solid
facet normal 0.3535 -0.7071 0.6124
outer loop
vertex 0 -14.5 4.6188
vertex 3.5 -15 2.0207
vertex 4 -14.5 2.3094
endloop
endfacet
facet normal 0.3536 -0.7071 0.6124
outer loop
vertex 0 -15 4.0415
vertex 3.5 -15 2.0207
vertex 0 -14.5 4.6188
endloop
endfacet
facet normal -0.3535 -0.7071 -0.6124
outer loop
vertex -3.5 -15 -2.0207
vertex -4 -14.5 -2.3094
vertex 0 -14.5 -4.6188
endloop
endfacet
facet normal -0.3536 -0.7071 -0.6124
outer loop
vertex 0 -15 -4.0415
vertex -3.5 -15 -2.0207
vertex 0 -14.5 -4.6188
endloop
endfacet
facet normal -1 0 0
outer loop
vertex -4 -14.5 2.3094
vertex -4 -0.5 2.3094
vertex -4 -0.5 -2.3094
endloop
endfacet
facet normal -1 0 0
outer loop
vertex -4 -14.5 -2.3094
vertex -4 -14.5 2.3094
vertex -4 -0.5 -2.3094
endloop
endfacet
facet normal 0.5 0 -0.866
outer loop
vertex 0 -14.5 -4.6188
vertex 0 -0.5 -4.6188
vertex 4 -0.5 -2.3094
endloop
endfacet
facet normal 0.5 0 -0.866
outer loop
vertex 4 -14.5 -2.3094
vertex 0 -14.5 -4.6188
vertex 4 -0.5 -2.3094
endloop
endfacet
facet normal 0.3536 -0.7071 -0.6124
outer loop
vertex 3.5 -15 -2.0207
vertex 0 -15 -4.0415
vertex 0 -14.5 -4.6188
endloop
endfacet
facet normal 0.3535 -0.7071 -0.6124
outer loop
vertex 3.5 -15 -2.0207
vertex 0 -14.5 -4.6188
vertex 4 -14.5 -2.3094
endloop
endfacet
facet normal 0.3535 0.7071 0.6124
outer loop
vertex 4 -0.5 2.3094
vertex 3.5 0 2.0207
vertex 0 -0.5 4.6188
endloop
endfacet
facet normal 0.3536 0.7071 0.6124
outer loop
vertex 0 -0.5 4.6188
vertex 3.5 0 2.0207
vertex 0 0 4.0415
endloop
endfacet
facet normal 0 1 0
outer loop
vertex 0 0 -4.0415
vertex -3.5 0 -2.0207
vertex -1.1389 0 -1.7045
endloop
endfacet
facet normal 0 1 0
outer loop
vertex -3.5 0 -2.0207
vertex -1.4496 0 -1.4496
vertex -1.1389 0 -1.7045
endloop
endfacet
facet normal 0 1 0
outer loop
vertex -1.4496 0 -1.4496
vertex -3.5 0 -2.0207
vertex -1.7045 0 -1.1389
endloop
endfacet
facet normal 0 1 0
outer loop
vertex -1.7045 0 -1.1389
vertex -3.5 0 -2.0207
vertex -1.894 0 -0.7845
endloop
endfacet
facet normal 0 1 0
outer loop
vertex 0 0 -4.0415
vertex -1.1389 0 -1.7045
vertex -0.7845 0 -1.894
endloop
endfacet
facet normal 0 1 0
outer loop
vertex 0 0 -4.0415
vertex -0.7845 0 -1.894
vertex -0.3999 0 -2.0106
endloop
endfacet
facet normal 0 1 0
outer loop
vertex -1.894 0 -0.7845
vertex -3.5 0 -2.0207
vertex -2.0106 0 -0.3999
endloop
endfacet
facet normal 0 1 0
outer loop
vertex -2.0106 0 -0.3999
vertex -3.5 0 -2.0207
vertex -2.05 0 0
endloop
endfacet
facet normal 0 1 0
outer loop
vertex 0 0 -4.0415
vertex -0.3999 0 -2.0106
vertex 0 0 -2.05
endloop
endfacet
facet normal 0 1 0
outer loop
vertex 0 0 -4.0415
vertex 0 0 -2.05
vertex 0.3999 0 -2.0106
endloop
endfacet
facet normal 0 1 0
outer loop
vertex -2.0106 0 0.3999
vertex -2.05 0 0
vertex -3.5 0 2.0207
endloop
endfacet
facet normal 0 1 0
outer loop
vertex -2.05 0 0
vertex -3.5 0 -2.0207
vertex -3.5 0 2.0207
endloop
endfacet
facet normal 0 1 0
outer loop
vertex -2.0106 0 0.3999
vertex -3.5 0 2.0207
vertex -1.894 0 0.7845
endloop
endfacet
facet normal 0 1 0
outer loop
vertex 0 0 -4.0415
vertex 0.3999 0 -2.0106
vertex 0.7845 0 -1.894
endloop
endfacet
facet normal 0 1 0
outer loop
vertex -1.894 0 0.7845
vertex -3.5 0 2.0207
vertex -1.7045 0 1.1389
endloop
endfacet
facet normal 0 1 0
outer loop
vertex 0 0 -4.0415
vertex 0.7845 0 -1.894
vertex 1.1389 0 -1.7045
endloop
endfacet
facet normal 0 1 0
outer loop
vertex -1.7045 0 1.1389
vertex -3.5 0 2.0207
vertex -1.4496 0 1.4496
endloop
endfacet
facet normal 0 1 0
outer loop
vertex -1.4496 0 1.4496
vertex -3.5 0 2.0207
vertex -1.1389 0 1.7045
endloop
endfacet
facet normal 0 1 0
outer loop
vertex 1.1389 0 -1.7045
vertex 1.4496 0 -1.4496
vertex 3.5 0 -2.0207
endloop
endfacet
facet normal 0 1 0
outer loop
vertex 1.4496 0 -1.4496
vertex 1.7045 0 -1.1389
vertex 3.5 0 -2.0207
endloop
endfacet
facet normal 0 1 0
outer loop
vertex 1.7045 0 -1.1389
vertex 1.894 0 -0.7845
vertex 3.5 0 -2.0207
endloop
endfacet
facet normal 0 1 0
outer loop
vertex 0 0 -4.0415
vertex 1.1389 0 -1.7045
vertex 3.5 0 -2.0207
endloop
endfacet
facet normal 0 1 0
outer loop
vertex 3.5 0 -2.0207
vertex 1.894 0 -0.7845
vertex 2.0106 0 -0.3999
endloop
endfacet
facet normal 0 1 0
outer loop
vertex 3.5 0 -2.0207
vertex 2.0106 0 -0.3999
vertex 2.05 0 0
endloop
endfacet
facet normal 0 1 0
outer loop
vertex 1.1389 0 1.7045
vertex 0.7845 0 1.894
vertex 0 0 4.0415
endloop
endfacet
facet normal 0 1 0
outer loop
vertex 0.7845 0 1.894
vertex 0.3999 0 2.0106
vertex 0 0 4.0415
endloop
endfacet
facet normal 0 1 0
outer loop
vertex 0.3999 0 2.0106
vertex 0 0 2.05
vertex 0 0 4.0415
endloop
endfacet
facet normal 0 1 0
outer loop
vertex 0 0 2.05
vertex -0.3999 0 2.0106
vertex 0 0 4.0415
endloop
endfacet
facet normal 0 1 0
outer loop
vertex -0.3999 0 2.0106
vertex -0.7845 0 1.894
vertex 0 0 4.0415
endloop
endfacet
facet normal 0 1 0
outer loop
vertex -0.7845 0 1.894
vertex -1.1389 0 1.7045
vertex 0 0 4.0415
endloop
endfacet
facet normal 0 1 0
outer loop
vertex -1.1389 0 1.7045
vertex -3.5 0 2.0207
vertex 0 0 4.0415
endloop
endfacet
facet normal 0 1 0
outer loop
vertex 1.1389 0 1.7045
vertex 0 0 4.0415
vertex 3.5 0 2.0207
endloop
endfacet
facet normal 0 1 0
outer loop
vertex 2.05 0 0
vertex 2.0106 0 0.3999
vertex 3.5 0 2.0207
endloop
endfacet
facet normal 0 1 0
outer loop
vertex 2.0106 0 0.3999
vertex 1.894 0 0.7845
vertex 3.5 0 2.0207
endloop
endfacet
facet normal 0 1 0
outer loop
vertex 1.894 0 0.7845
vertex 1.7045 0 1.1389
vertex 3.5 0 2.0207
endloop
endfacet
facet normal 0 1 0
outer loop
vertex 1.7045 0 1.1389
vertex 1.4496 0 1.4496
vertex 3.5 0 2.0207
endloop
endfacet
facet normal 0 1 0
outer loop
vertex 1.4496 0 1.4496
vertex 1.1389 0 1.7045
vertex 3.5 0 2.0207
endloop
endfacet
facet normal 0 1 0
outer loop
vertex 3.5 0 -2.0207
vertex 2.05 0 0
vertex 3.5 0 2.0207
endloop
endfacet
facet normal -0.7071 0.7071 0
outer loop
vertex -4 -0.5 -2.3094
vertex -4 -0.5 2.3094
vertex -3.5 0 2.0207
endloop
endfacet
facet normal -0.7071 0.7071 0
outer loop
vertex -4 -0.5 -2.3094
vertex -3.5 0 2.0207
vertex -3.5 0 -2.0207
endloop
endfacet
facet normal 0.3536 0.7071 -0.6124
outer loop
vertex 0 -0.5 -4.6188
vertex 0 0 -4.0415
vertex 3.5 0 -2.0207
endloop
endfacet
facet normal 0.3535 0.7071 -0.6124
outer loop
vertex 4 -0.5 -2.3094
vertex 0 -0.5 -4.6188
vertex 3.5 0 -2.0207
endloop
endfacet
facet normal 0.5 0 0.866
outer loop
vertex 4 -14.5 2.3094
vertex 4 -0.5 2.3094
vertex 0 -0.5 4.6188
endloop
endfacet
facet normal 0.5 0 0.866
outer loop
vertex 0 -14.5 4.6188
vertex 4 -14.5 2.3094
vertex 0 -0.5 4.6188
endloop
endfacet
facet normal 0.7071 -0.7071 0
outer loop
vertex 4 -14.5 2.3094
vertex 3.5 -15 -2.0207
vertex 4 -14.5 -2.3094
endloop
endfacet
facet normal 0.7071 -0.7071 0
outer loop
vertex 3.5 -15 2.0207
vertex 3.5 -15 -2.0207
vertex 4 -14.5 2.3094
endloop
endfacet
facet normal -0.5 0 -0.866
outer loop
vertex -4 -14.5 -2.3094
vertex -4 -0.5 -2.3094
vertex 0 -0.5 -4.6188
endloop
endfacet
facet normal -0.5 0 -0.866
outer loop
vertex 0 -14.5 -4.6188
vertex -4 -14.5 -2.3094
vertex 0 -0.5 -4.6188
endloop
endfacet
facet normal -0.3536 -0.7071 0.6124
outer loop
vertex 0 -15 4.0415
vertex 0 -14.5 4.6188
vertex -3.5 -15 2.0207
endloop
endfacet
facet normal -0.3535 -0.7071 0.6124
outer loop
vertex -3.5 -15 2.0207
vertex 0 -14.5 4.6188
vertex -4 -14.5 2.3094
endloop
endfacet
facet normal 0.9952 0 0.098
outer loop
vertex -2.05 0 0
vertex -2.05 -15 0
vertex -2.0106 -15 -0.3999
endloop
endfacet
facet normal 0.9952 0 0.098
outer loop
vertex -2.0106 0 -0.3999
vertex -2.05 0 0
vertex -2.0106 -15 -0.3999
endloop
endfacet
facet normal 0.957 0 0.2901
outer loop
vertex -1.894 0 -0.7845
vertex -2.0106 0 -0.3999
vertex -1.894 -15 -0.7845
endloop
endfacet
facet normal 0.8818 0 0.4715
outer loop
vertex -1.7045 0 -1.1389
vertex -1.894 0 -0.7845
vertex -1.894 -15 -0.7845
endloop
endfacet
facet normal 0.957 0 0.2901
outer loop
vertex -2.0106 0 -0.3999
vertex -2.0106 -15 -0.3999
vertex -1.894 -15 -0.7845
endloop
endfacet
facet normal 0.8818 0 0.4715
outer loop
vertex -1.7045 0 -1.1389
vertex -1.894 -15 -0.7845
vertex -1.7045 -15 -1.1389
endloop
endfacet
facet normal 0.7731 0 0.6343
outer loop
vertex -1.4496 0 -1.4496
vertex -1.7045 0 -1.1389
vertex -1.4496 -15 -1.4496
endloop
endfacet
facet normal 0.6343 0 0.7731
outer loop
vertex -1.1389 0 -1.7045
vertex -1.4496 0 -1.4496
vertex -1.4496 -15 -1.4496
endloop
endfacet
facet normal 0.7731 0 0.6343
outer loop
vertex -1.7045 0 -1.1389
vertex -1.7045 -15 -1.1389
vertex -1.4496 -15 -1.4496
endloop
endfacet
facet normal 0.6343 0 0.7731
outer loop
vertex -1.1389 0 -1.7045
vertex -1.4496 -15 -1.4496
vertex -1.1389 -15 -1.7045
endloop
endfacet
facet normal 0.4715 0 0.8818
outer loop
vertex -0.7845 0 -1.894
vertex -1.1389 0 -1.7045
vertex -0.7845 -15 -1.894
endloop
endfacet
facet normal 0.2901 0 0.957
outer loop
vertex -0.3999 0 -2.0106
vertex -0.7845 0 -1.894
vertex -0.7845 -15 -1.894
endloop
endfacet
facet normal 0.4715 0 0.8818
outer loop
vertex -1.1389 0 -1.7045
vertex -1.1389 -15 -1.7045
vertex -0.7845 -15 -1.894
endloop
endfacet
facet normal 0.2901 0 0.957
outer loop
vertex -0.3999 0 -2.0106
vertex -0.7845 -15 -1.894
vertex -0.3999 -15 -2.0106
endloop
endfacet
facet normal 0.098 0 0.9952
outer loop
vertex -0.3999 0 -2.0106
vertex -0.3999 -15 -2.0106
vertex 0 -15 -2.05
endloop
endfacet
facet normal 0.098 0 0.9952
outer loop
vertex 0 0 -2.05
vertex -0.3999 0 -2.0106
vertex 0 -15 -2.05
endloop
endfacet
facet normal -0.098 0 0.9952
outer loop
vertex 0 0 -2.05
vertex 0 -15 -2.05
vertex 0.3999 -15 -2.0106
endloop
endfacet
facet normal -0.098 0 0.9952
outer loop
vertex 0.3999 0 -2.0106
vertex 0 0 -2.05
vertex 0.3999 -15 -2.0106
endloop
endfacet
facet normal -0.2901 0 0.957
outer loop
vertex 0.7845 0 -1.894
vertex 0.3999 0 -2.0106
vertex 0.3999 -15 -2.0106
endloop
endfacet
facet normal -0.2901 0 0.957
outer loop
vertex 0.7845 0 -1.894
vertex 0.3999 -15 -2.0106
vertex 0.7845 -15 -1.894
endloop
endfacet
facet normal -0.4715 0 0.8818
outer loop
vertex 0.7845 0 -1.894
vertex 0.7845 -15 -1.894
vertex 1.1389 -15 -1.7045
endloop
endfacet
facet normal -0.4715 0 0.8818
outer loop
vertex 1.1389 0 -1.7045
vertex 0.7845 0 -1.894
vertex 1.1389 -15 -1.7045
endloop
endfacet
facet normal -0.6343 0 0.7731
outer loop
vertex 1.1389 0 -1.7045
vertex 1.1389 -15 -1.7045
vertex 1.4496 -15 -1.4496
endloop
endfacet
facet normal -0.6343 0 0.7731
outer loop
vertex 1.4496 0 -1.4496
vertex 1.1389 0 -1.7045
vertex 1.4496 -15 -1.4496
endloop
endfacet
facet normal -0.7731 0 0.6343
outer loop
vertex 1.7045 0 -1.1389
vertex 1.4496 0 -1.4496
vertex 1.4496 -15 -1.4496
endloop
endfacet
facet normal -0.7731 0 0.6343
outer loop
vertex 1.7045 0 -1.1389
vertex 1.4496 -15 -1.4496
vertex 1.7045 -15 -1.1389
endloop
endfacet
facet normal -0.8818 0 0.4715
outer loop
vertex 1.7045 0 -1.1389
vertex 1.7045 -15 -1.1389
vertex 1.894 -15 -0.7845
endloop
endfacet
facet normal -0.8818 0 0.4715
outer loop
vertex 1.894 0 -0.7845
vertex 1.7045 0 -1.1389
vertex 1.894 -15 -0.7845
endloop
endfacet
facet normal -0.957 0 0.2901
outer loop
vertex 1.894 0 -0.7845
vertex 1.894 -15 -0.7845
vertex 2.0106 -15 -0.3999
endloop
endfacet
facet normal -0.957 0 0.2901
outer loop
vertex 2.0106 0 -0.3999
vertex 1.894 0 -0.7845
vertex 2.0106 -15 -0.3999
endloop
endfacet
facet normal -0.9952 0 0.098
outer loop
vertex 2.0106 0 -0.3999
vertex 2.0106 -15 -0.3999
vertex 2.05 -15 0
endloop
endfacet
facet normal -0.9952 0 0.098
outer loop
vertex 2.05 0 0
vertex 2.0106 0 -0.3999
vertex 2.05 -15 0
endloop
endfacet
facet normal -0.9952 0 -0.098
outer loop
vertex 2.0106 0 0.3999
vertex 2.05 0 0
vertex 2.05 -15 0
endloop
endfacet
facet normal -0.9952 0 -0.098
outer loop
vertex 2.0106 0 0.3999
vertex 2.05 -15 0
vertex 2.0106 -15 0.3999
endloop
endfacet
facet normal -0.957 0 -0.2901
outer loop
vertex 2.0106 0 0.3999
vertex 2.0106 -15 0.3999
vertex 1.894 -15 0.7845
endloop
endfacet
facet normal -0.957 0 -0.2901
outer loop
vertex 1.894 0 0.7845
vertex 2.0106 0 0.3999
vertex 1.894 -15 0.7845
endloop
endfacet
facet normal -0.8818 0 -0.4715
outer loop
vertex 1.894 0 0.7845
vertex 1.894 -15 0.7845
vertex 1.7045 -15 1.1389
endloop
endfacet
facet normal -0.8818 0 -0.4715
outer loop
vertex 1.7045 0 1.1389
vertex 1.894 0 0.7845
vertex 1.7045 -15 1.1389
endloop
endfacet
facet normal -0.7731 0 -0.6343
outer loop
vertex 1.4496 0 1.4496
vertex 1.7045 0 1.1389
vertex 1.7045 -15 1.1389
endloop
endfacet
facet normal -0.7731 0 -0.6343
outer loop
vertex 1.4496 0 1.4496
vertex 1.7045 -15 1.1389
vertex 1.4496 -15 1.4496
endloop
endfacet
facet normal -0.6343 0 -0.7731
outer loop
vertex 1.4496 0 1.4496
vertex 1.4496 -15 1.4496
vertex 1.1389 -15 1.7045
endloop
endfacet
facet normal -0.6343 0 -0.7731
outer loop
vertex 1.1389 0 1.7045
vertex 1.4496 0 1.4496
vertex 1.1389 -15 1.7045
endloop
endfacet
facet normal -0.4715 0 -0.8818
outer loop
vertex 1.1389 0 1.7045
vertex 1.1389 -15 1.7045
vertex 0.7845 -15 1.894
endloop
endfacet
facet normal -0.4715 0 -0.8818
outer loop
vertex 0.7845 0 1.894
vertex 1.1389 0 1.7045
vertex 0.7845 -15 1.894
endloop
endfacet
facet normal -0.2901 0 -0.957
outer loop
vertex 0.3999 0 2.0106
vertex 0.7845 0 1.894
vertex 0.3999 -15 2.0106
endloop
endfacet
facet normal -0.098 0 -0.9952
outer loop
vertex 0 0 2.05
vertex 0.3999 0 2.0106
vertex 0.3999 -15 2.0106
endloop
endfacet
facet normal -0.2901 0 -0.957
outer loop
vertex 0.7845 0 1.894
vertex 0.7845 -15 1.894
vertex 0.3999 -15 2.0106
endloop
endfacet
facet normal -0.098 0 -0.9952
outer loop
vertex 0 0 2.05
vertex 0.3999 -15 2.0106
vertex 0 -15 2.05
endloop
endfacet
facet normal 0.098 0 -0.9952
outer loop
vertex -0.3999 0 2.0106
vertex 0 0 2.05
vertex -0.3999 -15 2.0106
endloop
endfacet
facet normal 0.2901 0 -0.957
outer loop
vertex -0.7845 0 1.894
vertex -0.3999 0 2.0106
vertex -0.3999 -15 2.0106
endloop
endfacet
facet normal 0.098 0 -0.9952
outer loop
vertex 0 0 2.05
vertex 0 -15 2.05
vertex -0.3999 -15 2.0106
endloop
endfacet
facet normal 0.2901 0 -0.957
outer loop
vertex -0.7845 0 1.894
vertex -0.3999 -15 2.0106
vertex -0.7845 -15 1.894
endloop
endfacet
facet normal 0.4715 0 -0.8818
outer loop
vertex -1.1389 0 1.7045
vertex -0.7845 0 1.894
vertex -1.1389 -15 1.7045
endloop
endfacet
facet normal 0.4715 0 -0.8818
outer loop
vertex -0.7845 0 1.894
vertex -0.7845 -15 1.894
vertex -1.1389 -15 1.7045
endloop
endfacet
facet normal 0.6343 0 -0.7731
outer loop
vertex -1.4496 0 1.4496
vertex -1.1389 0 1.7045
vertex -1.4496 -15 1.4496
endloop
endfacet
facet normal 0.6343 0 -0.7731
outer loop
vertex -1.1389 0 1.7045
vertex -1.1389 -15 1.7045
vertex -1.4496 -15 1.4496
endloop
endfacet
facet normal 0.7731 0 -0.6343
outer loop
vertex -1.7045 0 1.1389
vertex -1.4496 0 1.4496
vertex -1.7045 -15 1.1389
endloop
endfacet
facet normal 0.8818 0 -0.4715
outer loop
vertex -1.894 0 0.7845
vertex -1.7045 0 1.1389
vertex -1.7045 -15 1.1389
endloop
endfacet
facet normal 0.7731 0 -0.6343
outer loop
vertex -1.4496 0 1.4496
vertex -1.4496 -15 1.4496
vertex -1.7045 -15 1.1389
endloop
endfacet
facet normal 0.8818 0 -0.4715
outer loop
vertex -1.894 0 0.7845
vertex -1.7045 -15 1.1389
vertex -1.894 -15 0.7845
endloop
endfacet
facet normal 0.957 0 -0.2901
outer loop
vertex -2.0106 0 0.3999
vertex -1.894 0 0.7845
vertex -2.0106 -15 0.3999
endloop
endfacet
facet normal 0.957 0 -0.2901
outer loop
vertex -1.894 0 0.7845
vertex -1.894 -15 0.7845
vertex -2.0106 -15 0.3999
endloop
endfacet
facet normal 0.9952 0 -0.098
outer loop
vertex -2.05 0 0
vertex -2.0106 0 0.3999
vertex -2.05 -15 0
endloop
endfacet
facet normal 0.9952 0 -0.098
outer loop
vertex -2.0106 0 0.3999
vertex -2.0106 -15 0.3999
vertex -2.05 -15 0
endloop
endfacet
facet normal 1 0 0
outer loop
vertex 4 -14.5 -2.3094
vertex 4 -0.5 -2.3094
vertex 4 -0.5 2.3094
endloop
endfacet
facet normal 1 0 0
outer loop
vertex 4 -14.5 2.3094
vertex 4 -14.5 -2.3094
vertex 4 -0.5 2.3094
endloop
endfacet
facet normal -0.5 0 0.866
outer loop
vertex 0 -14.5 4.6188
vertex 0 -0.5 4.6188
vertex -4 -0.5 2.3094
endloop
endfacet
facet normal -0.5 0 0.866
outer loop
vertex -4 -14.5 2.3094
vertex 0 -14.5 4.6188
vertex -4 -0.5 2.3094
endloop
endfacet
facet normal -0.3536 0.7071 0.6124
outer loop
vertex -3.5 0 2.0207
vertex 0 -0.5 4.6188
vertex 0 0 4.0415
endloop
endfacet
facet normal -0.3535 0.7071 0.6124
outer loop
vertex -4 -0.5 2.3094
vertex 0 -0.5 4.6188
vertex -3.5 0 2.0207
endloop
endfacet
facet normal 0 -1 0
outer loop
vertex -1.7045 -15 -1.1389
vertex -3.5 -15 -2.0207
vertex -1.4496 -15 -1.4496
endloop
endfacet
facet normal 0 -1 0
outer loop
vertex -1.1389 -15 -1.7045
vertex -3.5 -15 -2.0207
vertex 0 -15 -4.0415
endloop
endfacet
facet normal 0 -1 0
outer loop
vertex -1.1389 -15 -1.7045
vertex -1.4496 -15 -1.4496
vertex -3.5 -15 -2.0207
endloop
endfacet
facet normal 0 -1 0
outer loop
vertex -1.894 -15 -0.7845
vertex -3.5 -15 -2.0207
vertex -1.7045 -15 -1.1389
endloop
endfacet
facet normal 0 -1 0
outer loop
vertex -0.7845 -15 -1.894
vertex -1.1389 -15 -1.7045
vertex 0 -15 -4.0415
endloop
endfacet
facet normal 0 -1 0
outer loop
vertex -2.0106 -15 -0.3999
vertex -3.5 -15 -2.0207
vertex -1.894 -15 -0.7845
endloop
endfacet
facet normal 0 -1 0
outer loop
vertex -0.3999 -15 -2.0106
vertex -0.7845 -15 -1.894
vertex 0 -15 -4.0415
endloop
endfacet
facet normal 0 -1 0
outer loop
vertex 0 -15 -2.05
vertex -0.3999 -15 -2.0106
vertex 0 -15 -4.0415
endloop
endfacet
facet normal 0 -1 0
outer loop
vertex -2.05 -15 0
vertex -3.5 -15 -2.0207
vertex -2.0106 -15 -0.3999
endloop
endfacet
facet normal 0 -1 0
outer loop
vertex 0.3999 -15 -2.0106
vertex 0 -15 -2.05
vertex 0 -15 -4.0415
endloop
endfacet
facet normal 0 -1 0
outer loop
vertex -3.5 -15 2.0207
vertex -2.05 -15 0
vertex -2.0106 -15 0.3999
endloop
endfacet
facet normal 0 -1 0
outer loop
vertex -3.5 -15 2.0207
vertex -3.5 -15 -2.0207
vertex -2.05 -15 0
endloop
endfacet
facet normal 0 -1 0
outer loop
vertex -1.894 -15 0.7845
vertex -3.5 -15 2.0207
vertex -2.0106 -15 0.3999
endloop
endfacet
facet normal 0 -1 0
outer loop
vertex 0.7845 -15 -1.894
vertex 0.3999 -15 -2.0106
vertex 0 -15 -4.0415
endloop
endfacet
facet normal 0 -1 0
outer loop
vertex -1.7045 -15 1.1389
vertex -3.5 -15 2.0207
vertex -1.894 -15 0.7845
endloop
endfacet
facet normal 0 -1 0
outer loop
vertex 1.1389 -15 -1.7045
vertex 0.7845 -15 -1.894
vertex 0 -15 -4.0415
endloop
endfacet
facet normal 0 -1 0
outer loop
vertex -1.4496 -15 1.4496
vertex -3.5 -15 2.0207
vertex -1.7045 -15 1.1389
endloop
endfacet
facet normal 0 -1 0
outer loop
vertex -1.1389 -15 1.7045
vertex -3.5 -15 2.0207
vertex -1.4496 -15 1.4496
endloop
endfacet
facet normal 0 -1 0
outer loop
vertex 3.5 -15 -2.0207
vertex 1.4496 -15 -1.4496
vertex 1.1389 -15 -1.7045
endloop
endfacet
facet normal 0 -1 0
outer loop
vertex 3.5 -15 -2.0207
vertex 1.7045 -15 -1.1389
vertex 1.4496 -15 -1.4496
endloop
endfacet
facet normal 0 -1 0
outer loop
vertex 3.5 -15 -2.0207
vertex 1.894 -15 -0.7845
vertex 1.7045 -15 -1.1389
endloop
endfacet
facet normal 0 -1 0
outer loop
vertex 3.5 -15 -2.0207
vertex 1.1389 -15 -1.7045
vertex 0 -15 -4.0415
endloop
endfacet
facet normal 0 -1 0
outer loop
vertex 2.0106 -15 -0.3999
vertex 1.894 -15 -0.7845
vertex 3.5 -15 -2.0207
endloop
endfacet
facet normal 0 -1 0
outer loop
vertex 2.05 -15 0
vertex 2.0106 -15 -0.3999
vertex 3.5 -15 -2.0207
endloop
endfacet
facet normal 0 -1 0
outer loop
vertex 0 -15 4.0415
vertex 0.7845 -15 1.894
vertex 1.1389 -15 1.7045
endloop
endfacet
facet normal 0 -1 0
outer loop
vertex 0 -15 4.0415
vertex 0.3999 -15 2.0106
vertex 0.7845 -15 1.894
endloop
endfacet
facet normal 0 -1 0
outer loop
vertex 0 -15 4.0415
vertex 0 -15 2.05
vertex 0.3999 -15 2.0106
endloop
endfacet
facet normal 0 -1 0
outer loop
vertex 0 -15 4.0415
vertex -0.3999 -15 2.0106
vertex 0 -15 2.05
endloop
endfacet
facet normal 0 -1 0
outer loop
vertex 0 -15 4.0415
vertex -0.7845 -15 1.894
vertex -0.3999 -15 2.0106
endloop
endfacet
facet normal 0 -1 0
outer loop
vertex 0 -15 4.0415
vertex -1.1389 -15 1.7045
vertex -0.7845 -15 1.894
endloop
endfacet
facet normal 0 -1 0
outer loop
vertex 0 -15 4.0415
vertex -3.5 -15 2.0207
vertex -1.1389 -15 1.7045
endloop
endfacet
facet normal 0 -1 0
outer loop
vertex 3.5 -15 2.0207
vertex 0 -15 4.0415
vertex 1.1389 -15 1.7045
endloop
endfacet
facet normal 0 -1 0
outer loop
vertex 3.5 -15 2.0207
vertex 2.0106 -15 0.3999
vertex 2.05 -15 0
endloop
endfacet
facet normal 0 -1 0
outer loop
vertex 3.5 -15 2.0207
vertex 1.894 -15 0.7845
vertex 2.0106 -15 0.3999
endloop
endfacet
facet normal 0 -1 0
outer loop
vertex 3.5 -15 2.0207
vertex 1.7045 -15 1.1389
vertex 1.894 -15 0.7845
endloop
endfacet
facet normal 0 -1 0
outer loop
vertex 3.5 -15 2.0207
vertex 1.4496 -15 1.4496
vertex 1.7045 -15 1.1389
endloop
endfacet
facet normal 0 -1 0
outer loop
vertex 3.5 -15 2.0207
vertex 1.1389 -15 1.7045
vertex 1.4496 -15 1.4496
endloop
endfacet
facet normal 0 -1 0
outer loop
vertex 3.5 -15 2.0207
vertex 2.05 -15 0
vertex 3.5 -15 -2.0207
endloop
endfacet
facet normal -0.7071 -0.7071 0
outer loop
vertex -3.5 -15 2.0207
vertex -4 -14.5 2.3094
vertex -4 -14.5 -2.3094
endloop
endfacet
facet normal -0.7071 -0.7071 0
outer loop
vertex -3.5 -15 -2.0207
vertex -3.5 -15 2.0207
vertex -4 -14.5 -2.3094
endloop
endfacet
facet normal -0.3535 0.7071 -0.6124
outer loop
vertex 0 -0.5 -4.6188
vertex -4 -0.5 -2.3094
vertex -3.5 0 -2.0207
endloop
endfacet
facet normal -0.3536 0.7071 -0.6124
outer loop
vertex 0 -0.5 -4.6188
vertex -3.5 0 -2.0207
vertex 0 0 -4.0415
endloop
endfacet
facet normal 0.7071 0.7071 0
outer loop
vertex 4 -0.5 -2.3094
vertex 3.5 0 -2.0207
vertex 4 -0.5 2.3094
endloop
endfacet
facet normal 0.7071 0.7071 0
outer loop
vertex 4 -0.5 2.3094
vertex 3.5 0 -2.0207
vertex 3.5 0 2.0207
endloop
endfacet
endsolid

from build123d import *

# Parameters (mm, degrees)
F1_DEPTH = 15
F2_D     = 4.1
F3_SIZE  = 0.5


with BuildPart() as f1:
    # F0 (on Front) → F1 (new body)
    with BuildSketch(Plane.XZ):
        Polygon((4, -2.3094010768), (4, 2.3094010768), (0, 4.6188021535), (-4, 2.3094010768), (-4, -2.3094010768), (0, -4.6188021535), align=None)
    extrude(amount=F1_DEPTH)

    # F2 (through all)
    with Locations(Plane(origin=(0, 0, 0), x_dir=(1, 0, 0), z_dir=(0, 1, 0))):
        with Locations((0, 0)):
            Hole(F2_D / 2)

    # F3
    f3_edges = [f1.edges().sort_by_distance(p)[0] for p in [
        (-2, 0, -3.464102),
        (-4, 0, 0),
        (-2, 0, 3.464102),
        (2, 0, 3.464102),
        (4, 0, 0),
        (2, 0, -3.464102),
        (4, -15, 0),
        (2, -15, 3.464102),
        (-2, -15, 3.464102),
        (-4, -15, 0),
        (-2, -15, -3.464102),
        (2, -15, -3.464102),
    ]]
    chamfer(f3_edges, length=F3_SIZE)


solid = f1.part
